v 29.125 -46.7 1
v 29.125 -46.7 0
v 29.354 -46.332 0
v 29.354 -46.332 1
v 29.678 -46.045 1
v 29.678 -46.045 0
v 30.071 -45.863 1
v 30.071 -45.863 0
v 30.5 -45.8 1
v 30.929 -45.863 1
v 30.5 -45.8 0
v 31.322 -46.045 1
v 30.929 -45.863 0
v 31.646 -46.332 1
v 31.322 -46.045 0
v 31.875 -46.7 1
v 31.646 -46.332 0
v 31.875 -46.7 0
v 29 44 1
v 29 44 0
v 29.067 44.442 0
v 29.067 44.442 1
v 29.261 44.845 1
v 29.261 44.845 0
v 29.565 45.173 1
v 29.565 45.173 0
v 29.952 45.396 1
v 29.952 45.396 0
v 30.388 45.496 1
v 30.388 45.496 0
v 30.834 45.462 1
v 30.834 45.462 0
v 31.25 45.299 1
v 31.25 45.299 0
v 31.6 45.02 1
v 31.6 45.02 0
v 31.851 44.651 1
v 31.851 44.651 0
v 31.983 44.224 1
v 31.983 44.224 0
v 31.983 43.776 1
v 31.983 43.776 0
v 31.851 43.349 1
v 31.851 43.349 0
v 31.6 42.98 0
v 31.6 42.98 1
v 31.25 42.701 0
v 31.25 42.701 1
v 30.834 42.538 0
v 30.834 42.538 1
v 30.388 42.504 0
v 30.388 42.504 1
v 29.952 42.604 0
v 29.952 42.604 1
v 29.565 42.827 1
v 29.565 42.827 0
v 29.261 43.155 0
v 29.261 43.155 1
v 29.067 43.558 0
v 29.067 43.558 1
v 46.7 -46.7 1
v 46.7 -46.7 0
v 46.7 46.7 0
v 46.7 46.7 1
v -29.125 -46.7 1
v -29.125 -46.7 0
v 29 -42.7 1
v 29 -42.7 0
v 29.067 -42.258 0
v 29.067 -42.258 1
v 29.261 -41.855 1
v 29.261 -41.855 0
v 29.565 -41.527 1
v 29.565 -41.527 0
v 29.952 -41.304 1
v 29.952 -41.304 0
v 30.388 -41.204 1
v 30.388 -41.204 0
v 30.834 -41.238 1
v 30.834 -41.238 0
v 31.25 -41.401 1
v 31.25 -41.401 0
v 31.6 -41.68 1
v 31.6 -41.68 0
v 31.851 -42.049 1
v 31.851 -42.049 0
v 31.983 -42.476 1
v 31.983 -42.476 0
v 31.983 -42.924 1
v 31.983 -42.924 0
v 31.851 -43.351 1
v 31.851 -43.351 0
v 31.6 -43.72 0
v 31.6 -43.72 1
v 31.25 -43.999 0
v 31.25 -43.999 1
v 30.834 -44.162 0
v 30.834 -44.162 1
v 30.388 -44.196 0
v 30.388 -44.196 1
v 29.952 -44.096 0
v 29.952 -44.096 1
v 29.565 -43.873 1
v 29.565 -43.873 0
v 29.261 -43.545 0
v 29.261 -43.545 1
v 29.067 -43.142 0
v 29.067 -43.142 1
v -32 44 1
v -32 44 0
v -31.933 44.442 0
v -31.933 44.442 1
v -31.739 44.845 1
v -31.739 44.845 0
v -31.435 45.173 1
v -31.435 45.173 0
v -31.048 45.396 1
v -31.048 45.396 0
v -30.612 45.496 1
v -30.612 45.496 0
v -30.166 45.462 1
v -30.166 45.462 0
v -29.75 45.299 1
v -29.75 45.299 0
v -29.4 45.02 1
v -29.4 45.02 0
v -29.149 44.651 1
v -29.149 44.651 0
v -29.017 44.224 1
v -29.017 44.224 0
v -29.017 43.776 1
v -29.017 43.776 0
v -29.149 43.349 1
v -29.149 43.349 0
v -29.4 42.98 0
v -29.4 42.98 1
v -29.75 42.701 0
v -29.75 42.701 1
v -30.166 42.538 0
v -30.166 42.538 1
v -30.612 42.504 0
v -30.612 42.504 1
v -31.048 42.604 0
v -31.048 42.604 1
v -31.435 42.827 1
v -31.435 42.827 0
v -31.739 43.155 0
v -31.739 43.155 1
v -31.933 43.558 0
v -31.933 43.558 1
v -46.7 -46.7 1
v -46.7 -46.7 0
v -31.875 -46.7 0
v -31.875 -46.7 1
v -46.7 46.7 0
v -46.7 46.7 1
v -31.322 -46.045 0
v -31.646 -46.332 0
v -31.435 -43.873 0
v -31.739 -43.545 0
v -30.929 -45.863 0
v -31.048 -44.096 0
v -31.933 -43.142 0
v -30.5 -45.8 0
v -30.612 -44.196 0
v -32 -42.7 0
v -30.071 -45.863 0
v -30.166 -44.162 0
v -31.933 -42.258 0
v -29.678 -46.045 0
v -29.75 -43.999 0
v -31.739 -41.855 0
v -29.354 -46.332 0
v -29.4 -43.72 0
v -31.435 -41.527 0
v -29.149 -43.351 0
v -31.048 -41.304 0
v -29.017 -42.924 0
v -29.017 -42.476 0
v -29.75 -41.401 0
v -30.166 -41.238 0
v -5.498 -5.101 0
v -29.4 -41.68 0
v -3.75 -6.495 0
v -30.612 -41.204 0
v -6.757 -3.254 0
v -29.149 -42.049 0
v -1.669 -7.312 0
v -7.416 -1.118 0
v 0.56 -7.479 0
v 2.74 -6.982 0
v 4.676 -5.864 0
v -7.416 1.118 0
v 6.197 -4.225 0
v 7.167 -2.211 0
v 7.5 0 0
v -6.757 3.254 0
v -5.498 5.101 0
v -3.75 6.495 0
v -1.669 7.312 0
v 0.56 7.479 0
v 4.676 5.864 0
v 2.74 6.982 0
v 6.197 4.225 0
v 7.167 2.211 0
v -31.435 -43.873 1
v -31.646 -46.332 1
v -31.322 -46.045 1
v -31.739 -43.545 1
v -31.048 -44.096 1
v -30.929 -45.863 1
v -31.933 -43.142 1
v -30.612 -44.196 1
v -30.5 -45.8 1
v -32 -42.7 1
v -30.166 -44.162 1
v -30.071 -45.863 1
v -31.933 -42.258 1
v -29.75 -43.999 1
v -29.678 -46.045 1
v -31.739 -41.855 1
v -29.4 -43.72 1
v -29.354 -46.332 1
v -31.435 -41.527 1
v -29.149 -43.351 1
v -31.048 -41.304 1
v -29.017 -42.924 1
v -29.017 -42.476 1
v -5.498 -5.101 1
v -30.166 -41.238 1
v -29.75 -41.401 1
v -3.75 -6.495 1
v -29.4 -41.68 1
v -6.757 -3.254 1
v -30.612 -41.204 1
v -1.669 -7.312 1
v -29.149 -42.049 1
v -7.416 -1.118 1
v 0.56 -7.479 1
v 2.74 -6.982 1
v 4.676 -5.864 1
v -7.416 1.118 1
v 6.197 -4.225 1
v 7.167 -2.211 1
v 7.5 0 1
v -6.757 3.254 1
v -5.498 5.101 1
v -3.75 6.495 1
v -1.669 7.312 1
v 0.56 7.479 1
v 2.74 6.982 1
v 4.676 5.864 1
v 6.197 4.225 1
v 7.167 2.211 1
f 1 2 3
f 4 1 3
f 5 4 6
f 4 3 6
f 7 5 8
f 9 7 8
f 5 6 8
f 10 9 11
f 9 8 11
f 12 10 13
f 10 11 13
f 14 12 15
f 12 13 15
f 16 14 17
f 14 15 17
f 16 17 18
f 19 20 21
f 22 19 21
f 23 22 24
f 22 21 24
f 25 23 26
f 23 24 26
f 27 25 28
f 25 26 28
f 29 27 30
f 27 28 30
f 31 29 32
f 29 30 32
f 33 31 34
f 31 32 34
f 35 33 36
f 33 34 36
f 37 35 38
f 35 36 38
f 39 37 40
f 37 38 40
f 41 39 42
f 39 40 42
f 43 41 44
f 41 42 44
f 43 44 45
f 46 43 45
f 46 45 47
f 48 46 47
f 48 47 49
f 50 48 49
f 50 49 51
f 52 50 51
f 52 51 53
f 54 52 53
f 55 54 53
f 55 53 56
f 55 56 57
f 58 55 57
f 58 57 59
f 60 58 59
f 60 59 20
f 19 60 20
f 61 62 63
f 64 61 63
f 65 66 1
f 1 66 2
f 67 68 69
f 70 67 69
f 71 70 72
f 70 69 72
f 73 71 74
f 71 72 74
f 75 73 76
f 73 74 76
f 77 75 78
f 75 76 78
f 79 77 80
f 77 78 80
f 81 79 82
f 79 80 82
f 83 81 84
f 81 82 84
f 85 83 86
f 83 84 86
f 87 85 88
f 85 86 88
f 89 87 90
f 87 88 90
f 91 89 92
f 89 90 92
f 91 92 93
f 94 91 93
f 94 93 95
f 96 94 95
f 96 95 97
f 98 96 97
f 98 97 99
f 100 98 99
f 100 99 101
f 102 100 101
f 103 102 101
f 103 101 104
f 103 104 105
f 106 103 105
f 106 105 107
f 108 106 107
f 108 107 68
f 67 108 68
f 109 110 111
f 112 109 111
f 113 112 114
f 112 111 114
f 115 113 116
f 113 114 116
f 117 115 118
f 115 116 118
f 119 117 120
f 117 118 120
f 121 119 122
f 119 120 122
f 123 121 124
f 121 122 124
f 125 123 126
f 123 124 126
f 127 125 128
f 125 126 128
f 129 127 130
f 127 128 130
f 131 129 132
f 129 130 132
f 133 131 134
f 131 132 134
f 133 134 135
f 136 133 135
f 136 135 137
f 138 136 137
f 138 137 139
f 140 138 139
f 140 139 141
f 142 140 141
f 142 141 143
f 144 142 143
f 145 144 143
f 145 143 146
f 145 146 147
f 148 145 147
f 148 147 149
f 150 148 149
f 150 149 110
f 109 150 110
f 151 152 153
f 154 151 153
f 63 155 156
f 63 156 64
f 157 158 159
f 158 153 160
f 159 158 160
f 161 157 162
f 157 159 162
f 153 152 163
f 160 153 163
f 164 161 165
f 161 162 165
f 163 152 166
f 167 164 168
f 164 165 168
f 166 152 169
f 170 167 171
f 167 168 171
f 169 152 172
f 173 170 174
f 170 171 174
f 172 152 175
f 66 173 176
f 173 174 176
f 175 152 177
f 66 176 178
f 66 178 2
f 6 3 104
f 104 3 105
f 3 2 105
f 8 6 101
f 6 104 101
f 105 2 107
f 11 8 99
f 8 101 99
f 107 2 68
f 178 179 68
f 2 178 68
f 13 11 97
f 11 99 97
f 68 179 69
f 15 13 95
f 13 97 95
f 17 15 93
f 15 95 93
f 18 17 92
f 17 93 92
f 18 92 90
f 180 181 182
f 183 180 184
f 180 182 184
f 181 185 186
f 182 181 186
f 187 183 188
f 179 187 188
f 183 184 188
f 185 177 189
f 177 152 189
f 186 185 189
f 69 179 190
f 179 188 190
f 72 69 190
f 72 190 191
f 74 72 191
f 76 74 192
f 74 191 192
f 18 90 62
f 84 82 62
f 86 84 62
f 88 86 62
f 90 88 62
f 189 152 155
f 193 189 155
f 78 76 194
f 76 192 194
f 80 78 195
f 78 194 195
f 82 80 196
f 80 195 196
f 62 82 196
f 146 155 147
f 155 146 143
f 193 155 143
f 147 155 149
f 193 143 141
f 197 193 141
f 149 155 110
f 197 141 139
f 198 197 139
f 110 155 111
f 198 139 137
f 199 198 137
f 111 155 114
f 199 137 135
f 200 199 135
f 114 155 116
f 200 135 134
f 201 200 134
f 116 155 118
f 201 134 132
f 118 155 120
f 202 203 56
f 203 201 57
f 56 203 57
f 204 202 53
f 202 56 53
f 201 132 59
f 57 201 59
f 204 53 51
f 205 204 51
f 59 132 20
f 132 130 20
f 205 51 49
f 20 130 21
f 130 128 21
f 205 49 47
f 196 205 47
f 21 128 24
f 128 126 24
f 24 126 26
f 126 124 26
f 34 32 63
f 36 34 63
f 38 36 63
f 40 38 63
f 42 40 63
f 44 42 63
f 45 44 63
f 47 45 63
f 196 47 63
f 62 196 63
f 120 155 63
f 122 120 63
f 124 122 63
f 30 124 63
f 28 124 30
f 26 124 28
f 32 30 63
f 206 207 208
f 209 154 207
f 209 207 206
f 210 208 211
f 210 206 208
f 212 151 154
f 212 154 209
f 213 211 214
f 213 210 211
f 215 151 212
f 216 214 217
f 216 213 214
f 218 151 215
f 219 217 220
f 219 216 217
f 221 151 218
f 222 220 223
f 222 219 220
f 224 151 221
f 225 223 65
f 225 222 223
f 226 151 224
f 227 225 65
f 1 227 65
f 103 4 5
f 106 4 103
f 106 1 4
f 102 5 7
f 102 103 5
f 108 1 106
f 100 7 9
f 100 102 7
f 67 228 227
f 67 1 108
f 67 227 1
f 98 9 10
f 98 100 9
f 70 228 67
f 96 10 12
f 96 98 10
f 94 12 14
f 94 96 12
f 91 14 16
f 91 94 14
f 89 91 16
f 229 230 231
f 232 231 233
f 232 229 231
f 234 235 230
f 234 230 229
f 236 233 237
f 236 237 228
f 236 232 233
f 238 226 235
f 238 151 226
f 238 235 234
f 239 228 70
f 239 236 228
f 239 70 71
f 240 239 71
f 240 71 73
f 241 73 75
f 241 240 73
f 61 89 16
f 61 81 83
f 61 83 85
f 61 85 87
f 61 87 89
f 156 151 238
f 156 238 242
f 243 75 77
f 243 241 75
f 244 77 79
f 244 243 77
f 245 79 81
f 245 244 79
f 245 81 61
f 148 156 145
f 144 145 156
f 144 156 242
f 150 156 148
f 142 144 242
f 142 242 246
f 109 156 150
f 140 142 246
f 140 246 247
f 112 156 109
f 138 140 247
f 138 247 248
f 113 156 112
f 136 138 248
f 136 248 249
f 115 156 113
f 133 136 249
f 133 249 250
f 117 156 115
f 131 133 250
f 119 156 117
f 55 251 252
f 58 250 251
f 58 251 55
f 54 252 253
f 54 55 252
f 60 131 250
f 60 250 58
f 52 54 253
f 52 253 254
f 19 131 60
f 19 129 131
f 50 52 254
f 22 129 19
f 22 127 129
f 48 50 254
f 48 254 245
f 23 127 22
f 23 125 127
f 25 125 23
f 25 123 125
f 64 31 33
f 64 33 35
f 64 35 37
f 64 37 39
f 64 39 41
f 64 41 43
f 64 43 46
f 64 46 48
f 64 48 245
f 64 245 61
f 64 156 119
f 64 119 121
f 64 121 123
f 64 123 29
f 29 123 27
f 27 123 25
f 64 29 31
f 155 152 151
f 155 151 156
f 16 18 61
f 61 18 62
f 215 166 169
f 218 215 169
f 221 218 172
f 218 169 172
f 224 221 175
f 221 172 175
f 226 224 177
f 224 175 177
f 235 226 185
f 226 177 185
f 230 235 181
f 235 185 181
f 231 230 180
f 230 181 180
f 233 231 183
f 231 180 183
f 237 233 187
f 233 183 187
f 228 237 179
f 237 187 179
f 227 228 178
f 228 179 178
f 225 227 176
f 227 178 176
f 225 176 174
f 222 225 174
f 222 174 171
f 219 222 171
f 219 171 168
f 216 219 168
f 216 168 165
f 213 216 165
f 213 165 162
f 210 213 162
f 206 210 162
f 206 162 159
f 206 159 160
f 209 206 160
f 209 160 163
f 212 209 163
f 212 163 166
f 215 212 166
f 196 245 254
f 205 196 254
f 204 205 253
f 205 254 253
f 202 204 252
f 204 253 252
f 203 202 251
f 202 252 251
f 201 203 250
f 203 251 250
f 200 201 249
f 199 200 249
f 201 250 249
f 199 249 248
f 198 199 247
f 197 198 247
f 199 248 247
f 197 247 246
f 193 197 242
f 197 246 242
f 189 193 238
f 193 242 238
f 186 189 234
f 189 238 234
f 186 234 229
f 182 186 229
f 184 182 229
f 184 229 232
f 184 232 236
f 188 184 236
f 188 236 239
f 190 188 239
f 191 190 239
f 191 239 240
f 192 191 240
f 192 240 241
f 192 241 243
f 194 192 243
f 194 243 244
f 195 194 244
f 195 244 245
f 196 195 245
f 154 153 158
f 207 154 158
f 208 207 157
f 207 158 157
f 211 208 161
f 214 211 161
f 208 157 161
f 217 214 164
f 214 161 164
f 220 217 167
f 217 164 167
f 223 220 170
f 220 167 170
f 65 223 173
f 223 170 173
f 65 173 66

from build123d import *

# Parameters (mm, degrees)
SKETCH1_W                    = 93.4
SKETCH1_H                    = 93.4
BOSS_EXTRUDE1_DEPTH          = 1
F_3_0_3_DIAMETER_HOLE1_D     = 3
F_3_0_3_DIAMETER_HOLE1_DEPTH = 1
SKETCH_1_R                   = 7.5
CUT_EXTRUDE_1_DEPTH          = 67.051343665


with BuildPart() as part:
    # Sketch1 → Boss-Extrude1 (new body)
    with BuildSketch(Plane.XY):
        Rectangle(SKETCH1_W, SKETCH1_H)
    extrude(amount=BOSS_EXTRUDE1_DEPTH)

    # Ø3.0 (3) Diameter Hole1
    with Locations(Plane.XY.offset(1)):
        with Locations((-30.5, -47.3), (30.5, -47.3), (30.5, -42.7), (-30.5, -42.7), (-30.5, 44), (30.5, 44), (-30.5, -66), (30.5, -66)):
            Hole(F_3_0_3_DIAMETER_HOLE1_D / 2, depth=F_3_0_3_DIAMETER_HOLE1_DEPTH)

    # Эскиз1 → Вырез-Вытянуть1 (cut, through all)
    with BuildSketch(Plane.XY.offset(1)):
        Circle(SKETCH_1_R)
    extrude(amount=-CUT_EXTRUDE_1_DEPTH, mode=Mode.SUBTRACT)


solid = part.part
